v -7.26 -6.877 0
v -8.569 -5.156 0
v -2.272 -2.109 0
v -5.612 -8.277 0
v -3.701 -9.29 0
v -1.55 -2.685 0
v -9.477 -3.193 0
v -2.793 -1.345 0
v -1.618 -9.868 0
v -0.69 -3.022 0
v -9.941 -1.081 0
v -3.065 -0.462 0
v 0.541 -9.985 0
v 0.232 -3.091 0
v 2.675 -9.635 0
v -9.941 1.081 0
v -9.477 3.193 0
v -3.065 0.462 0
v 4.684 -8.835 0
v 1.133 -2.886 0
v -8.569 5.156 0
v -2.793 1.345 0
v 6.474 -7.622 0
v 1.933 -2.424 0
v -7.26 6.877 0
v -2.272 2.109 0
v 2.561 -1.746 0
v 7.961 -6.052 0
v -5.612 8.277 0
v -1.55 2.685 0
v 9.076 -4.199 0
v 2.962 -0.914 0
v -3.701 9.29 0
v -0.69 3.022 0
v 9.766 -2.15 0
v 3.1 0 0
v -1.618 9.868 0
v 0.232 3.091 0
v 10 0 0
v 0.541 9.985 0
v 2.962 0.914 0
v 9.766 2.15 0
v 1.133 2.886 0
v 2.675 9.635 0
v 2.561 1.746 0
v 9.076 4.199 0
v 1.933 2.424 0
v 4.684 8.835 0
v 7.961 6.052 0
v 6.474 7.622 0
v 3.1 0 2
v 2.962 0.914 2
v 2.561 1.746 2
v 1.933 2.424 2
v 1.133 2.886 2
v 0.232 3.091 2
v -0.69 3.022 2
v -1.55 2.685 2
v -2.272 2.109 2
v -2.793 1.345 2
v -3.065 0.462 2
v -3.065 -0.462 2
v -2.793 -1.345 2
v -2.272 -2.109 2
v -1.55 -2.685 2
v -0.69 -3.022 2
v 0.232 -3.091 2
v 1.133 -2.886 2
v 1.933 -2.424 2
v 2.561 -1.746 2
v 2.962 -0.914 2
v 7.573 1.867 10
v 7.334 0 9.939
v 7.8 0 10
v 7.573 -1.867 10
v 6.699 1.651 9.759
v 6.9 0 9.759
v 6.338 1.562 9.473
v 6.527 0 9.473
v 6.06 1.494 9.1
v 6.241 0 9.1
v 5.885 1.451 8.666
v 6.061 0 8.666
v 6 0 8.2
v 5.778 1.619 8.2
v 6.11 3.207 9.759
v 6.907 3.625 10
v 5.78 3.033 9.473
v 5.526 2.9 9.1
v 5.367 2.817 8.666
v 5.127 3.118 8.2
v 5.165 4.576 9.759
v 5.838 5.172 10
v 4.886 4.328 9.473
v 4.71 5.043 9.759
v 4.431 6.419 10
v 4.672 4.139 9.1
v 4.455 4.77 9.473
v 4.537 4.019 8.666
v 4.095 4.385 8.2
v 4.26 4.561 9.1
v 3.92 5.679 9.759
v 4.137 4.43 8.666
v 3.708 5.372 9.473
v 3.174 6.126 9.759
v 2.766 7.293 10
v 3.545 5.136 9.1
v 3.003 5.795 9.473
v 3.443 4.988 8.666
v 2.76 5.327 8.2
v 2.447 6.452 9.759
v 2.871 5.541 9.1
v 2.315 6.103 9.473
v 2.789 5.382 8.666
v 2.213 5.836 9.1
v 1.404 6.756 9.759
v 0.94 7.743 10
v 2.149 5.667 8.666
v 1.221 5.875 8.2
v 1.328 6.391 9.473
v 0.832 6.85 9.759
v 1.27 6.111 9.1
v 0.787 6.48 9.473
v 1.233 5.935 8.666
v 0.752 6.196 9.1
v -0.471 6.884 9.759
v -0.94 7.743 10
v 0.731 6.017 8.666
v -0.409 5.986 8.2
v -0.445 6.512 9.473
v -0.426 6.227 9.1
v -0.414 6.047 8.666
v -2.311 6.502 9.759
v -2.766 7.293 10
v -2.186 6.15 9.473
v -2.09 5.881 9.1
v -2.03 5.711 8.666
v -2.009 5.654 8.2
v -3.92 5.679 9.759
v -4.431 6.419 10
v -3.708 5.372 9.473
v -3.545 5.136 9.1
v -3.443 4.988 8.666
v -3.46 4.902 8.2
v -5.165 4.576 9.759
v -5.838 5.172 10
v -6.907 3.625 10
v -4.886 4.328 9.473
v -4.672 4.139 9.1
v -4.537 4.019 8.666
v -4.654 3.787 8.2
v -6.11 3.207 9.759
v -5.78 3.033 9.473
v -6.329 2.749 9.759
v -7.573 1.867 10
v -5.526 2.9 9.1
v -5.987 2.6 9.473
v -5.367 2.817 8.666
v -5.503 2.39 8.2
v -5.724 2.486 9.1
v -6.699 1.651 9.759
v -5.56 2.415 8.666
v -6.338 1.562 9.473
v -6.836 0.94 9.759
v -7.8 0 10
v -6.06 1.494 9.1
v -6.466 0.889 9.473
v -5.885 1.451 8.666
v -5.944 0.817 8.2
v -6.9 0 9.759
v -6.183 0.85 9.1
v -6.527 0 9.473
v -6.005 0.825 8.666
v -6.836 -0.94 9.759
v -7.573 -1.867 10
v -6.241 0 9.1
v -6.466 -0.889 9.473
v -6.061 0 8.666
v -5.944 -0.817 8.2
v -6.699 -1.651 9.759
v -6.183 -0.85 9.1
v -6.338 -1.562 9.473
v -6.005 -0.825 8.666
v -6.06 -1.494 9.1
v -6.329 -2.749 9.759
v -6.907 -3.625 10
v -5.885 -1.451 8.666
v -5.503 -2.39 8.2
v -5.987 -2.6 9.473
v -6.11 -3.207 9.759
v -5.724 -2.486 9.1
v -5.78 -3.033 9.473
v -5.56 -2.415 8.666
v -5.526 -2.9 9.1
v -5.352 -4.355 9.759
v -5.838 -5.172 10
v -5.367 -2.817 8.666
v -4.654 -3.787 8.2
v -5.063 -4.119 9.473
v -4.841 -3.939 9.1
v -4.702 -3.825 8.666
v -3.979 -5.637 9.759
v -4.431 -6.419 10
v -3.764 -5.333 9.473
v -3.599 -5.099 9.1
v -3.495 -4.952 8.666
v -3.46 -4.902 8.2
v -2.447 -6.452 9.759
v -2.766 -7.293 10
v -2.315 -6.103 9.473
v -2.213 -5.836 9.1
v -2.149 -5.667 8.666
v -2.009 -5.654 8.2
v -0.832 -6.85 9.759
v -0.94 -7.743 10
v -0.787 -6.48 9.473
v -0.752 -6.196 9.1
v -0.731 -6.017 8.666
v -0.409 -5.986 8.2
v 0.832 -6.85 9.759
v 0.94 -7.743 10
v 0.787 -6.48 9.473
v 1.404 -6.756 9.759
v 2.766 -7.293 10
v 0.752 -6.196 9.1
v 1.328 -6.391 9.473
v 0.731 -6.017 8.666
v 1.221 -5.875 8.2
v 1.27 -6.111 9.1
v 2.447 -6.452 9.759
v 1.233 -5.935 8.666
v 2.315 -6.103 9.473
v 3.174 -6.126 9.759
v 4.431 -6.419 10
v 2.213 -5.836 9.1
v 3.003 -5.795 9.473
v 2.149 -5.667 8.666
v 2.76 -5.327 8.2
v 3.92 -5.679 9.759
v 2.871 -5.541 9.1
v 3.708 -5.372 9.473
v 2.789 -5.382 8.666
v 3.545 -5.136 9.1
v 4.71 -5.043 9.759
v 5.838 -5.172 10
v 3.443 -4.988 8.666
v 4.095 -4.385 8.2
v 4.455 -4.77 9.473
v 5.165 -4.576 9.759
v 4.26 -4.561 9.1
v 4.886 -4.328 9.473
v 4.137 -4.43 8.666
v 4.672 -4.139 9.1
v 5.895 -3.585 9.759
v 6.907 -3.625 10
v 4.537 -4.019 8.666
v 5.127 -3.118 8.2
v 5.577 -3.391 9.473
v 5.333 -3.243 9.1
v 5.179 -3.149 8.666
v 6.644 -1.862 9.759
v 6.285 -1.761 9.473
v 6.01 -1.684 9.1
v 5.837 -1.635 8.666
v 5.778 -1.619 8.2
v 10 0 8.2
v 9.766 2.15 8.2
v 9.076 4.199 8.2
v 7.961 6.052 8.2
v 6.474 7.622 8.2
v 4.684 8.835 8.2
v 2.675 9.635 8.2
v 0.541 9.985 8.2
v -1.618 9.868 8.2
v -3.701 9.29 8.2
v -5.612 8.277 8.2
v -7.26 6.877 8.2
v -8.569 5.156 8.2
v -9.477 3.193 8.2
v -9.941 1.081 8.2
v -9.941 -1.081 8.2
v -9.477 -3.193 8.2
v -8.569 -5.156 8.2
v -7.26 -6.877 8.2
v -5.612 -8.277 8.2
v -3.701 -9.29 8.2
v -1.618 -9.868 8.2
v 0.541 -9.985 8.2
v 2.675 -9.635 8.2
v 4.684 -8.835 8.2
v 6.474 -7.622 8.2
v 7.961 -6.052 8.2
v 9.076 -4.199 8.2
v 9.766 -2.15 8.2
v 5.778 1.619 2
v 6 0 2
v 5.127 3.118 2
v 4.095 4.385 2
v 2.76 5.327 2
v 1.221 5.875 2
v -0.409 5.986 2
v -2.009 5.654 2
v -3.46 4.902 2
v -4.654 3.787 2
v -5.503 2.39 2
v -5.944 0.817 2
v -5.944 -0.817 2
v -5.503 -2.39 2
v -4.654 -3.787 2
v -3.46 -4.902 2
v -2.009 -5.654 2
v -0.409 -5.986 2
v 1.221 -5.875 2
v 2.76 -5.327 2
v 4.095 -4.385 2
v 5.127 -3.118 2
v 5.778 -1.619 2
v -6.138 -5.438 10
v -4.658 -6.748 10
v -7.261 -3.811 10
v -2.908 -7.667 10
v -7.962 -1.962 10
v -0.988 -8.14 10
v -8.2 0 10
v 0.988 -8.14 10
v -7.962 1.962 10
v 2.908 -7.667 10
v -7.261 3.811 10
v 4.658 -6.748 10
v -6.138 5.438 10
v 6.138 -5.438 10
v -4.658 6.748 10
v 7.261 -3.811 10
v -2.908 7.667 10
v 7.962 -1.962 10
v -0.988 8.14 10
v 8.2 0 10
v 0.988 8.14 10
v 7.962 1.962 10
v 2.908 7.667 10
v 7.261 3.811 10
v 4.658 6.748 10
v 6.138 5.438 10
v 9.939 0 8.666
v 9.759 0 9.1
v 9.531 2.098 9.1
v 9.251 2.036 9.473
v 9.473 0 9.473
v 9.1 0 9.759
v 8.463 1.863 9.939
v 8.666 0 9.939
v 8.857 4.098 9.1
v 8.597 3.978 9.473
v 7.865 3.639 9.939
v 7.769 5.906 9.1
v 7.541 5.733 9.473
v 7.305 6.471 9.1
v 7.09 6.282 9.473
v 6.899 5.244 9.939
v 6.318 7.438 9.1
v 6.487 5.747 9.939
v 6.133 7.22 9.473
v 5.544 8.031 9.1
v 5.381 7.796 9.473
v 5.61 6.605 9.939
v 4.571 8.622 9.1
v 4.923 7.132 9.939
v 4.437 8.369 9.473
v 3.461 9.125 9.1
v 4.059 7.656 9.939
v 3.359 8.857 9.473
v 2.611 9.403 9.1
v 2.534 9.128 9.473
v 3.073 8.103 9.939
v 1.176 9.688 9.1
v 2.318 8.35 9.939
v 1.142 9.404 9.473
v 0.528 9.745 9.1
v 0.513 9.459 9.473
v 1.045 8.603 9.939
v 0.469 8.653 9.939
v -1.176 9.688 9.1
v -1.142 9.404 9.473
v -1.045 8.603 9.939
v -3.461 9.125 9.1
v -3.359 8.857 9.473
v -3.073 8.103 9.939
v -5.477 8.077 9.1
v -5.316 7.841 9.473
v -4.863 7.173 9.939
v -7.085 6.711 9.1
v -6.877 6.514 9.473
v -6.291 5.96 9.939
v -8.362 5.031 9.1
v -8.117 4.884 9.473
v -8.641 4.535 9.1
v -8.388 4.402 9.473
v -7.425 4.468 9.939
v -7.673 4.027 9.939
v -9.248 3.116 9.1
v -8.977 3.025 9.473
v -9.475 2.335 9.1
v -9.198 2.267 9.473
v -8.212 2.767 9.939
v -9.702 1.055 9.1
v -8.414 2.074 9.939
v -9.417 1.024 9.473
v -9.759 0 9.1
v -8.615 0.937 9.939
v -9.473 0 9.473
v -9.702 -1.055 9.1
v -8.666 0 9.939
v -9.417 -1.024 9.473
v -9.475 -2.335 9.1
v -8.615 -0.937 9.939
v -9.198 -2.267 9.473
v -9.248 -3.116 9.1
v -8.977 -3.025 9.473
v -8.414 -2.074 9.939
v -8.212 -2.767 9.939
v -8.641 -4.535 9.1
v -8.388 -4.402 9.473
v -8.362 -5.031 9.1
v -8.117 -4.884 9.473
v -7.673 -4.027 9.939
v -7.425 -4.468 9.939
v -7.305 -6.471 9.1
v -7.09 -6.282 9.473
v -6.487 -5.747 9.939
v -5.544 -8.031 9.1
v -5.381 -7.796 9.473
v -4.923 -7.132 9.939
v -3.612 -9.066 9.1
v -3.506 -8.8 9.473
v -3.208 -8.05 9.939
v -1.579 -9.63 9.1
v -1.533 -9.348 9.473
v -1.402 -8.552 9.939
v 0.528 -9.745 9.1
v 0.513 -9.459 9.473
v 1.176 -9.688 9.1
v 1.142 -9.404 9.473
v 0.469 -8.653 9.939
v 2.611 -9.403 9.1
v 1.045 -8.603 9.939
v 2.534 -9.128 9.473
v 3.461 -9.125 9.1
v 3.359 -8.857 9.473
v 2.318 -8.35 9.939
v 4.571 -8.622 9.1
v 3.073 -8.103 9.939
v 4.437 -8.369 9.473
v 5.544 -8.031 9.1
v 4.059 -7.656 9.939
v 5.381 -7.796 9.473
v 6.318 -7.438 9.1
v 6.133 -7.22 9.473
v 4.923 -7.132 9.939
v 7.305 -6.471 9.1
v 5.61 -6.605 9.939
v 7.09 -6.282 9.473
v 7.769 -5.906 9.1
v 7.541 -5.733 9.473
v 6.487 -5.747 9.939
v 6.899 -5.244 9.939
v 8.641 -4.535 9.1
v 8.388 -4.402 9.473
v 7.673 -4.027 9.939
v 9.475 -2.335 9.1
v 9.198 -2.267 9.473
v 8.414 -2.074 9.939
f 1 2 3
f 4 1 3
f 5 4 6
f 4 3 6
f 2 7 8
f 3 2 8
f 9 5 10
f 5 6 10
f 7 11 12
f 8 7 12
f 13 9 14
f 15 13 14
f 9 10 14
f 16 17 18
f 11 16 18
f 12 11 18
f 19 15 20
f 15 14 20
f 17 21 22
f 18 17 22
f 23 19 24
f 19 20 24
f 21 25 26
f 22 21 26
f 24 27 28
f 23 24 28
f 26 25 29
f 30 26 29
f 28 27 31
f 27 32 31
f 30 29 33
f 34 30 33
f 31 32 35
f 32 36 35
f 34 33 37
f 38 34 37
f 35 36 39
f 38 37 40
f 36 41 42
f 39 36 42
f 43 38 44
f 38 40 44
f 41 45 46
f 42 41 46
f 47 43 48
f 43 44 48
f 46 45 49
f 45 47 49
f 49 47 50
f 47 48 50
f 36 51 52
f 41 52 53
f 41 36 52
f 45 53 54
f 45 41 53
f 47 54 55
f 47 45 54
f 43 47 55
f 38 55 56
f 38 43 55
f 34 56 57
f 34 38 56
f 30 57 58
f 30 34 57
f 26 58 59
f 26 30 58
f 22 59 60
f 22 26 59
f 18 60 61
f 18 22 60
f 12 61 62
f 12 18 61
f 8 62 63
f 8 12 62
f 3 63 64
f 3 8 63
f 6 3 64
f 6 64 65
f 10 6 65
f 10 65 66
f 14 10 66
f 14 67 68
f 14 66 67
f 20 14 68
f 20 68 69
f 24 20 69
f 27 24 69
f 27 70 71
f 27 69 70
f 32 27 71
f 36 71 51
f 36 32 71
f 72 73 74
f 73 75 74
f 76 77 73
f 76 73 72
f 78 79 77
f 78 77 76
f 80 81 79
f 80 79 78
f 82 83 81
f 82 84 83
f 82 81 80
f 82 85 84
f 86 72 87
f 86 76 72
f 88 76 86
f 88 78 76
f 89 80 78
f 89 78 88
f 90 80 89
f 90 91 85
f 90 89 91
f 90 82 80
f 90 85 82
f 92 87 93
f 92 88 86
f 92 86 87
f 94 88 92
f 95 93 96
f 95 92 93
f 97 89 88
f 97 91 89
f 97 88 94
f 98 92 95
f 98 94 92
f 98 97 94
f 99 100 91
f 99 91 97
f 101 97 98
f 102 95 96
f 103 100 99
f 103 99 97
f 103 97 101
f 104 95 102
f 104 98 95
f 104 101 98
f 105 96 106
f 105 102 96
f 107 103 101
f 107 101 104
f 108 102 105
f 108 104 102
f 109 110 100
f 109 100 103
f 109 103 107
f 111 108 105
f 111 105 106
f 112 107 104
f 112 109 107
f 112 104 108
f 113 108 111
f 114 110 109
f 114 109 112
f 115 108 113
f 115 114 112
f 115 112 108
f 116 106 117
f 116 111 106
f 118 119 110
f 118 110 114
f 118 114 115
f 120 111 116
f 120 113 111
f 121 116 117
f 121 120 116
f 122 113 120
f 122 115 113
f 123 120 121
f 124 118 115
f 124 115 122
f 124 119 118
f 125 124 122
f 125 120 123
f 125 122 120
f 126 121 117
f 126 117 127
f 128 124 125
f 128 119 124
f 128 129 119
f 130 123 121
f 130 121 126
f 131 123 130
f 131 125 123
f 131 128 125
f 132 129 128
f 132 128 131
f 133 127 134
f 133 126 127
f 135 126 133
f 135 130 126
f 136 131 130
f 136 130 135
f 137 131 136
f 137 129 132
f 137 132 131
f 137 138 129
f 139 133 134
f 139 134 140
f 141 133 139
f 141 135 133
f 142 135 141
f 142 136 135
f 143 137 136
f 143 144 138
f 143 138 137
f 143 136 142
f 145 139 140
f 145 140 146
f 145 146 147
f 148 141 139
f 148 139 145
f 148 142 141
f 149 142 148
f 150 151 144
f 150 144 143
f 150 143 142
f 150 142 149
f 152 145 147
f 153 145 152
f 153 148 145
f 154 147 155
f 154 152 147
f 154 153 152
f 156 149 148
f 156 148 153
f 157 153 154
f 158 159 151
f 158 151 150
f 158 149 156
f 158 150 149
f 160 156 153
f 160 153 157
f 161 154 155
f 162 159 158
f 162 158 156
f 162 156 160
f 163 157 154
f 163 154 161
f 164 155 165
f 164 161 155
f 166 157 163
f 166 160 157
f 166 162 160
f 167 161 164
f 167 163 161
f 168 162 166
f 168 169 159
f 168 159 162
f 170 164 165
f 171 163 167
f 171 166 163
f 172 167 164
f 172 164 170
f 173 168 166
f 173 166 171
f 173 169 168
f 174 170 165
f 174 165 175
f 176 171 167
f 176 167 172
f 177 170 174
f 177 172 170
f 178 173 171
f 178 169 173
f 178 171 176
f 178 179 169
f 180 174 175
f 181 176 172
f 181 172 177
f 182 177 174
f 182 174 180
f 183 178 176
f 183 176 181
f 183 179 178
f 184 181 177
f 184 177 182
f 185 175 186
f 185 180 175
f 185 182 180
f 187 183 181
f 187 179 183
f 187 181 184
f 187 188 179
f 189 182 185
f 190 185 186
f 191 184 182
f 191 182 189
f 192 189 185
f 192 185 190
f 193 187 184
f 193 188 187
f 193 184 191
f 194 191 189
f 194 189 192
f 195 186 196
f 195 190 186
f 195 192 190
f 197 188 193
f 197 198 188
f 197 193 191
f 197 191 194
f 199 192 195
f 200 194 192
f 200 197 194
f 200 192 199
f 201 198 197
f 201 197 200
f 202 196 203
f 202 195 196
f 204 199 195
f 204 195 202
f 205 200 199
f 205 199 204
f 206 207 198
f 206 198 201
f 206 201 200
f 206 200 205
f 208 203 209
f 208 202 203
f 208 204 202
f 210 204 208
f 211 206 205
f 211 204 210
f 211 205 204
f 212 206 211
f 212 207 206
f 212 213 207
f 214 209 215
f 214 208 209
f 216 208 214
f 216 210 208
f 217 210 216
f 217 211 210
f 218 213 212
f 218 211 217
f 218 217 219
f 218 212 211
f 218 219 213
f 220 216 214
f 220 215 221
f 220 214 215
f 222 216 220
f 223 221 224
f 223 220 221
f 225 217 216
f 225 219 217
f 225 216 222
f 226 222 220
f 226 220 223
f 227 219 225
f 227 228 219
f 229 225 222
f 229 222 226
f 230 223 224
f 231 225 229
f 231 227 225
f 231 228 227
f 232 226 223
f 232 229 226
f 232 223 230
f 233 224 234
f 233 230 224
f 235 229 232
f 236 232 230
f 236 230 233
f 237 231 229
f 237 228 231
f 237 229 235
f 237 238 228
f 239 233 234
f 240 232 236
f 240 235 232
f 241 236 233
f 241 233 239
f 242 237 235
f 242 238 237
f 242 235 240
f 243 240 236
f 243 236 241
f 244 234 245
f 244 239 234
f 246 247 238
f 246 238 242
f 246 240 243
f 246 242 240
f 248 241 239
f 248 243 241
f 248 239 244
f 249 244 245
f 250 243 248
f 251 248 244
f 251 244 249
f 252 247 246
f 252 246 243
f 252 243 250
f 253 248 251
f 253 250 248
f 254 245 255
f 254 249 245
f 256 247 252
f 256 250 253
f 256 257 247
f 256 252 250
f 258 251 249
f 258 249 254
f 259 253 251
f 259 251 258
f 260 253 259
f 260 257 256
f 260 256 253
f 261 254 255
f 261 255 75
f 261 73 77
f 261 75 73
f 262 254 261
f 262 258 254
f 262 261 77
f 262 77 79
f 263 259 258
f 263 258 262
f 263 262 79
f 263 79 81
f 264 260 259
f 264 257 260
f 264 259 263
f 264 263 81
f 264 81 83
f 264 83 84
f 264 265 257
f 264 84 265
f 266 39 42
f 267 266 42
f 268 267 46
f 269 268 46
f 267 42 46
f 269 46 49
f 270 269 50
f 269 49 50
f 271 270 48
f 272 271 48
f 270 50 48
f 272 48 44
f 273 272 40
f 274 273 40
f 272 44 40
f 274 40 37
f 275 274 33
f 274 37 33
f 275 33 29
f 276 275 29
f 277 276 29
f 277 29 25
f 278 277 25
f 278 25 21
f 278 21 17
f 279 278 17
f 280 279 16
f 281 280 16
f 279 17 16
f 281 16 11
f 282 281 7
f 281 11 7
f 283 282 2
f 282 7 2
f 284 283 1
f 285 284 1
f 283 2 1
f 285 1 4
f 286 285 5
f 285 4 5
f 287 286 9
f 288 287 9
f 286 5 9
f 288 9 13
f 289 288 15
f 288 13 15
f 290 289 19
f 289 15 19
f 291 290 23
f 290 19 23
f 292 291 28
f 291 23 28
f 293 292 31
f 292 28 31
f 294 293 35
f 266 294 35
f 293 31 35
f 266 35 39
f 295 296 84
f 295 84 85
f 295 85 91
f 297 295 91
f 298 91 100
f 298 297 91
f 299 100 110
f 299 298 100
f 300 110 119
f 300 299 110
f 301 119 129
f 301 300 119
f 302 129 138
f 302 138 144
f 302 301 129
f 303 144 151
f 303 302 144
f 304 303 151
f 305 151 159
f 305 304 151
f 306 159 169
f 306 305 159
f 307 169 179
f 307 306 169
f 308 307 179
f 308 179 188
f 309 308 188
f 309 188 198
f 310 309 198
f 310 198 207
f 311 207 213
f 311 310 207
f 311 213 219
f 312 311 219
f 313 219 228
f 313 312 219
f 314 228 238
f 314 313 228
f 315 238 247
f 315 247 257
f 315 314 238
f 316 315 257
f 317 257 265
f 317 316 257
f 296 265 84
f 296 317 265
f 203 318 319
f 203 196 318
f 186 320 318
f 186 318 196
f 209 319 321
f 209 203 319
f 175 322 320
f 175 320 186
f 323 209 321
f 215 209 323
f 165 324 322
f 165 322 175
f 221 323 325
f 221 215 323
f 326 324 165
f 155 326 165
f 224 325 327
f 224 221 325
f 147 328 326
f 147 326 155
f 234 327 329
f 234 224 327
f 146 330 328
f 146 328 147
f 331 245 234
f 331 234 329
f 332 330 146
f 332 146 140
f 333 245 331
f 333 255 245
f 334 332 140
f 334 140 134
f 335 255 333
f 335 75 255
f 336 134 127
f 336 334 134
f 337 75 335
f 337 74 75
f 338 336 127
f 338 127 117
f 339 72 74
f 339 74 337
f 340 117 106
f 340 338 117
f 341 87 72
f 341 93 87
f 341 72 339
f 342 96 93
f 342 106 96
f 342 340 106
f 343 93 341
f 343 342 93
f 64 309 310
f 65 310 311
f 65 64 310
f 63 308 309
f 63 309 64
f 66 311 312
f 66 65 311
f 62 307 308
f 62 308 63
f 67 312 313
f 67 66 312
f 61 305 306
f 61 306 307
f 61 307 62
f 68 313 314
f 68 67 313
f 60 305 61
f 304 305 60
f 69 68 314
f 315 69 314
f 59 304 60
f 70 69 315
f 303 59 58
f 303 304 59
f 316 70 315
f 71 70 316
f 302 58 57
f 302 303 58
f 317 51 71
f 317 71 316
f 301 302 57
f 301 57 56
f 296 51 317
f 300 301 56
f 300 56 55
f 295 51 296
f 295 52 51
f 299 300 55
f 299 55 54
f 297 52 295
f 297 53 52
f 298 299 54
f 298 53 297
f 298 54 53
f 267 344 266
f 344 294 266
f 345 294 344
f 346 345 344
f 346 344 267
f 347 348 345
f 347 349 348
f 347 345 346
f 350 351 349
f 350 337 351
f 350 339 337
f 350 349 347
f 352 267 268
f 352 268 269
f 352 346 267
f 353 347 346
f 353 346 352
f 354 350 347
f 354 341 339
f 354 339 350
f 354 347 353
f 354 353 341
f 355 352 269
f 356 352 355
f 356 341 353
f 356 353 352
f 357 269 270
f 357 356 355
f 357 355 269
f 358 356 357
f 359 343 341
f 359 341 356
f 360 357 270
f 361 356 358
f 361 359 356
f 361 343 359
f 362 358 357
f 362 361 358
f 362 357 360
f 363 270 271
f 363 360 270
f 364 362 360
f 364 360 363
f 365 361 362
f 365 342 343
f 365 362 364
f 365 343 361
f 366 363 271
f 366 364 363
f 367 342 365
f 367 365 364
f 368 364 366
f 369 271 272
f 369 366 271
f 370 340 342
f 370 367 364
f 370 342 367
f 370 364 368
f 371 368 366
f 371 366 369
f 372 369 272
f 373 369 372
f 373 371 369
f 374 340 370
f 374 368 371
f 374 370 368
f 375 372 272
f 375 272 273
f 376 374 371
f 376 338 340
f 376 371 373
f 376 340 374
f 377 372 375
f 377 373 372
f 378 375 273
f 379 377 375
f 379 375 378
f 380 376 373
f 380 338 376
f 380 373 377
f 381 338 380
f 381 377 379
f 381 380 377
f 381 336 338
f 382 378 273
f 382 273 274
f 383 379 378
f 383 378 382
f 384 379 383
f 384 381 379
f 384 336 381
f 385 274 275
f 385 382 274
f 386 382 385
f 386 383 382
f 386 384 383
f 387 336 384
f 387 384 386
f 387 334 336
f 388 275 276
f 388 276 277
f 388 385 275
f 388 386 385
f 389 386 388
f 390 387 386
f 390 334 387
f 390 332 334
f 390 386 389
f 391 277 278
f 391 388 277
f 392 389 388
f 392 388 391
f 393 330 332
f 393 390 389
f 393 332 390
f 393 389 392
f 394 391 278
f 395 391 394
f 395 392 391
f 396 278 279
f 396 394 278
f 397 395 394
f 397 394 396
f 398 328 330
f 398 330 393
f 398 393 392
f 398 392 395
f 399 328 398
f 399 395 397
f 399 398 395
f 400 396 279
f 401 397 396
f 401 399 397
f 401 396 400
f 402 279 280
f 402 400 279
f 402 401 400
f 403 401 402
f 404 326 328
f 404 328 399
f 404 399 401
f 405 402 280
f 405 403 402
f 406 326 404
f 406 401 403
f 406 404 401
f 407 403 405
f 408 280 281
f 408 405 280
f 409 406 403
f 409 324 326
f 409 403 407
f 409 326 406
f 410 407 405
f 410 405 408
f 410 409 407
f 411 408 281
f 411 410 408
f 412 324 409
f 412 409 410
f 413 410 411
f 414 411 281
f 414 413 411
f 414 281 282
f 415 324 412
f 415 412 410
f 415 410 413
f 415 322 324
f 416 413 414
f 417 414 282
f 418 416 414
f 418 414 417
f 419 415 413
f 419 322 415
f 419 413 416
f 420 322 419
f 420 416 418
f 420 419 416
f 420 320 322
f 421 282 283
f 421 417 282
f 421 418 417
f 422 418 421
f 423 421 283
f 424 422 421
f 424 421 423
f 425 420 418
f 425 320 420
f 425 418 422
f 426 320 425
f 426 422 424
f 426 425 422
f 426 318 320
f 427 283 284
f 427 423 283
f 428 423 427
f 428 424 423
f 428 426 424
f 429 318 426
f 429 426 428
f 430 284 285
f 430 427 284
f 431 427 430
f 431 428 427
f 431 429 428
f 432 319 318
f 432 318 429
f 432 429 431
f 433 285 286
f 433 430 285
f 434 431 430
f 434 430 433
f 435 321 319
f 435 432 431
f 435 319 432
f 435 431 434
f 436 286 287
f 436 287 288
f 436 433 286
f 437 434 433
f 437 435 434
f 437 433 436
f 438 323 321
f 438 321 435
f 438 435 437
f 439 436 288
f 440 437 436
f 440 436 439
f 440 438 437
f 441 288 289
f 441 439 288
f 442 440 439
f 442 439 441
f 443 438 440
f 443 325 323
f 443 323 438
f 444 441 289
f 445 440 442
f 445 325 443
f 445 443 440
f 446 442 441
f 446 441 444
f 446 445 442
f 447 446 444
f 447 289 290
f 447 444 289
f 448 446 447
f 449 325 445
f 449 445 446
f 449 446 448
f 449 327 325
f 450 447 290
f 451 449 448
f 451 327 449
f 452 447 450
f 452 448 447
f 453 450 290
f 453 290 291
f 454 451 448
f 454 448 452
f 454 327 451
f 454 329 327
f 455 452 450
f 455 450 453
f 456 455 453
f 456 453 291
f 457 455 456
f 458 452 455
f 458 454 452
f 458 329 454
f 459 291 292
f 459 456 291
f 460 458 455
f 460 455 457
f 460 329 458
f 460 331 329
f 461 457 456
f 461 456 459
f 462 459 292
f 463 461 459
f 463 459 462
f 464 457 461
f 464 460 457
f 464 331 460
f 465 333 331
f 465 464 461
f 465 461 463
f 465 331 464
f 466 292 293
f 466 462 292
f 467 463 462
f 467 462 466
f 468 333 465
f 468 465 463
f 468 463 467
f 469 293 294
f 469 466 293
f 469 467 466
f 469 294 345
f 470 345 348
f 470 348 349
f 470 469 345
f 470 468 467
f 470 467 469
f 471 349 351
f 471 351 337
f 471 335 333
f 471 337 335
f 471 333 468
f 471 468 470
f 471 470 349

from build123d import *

# Parameters (mm, degrees)
CYLINDER002_R     = 6
CYLINDER002_DEPTH = 8
CYLINDER001_R     = 3.1
CYLINDER001_DEPTH = 10
CYLINDER_R        = 10
CYLINDER_DEPTH    = 10
FILLET_R          = 1.8


with BuildPart() as cylinder002:
    # Cylinder002 → Cylinder002 (new body)
    with BuildSketch(Plane.XY.offset(2)):
        Circle(CYLINDER002_R)
    extrude(amount=CYLINDER002_DEPTH)


with BuildPart() as cylinder001:
    # Cylinder001 → Cylinder001 (new body)
    with BuildSketch(Plane.XY):
        Circle(CYLINDER001_R)
    extrude(amount=CYLINDER001_DEPTH)


with BuildPart() as fillet_body:
    # Cylinder → Cylinder (new body)
    with BuildSketch(Plane.XY):
        Circle(CYLINDER_R)
    extrude(amount=CYLINDER_DEPTH)

    # Cut: cut Cylinder001
    add(cylinder001.part, mode=Mode.SUBTRACT)

    # Cut001: cut Cylinder002
    add(cylinder002.part, mode=Mode.SUBTRACT)

    # Fillet
    fillet_edges = [fillet_body.edges().sort_by_distance(p)[0] for p in [
        (-10, 0, 10),
        (-6, 0, 10),
    ]]
    fillet(fillet_edges, radius=FILLET_R)


solid = fillet_body.part
